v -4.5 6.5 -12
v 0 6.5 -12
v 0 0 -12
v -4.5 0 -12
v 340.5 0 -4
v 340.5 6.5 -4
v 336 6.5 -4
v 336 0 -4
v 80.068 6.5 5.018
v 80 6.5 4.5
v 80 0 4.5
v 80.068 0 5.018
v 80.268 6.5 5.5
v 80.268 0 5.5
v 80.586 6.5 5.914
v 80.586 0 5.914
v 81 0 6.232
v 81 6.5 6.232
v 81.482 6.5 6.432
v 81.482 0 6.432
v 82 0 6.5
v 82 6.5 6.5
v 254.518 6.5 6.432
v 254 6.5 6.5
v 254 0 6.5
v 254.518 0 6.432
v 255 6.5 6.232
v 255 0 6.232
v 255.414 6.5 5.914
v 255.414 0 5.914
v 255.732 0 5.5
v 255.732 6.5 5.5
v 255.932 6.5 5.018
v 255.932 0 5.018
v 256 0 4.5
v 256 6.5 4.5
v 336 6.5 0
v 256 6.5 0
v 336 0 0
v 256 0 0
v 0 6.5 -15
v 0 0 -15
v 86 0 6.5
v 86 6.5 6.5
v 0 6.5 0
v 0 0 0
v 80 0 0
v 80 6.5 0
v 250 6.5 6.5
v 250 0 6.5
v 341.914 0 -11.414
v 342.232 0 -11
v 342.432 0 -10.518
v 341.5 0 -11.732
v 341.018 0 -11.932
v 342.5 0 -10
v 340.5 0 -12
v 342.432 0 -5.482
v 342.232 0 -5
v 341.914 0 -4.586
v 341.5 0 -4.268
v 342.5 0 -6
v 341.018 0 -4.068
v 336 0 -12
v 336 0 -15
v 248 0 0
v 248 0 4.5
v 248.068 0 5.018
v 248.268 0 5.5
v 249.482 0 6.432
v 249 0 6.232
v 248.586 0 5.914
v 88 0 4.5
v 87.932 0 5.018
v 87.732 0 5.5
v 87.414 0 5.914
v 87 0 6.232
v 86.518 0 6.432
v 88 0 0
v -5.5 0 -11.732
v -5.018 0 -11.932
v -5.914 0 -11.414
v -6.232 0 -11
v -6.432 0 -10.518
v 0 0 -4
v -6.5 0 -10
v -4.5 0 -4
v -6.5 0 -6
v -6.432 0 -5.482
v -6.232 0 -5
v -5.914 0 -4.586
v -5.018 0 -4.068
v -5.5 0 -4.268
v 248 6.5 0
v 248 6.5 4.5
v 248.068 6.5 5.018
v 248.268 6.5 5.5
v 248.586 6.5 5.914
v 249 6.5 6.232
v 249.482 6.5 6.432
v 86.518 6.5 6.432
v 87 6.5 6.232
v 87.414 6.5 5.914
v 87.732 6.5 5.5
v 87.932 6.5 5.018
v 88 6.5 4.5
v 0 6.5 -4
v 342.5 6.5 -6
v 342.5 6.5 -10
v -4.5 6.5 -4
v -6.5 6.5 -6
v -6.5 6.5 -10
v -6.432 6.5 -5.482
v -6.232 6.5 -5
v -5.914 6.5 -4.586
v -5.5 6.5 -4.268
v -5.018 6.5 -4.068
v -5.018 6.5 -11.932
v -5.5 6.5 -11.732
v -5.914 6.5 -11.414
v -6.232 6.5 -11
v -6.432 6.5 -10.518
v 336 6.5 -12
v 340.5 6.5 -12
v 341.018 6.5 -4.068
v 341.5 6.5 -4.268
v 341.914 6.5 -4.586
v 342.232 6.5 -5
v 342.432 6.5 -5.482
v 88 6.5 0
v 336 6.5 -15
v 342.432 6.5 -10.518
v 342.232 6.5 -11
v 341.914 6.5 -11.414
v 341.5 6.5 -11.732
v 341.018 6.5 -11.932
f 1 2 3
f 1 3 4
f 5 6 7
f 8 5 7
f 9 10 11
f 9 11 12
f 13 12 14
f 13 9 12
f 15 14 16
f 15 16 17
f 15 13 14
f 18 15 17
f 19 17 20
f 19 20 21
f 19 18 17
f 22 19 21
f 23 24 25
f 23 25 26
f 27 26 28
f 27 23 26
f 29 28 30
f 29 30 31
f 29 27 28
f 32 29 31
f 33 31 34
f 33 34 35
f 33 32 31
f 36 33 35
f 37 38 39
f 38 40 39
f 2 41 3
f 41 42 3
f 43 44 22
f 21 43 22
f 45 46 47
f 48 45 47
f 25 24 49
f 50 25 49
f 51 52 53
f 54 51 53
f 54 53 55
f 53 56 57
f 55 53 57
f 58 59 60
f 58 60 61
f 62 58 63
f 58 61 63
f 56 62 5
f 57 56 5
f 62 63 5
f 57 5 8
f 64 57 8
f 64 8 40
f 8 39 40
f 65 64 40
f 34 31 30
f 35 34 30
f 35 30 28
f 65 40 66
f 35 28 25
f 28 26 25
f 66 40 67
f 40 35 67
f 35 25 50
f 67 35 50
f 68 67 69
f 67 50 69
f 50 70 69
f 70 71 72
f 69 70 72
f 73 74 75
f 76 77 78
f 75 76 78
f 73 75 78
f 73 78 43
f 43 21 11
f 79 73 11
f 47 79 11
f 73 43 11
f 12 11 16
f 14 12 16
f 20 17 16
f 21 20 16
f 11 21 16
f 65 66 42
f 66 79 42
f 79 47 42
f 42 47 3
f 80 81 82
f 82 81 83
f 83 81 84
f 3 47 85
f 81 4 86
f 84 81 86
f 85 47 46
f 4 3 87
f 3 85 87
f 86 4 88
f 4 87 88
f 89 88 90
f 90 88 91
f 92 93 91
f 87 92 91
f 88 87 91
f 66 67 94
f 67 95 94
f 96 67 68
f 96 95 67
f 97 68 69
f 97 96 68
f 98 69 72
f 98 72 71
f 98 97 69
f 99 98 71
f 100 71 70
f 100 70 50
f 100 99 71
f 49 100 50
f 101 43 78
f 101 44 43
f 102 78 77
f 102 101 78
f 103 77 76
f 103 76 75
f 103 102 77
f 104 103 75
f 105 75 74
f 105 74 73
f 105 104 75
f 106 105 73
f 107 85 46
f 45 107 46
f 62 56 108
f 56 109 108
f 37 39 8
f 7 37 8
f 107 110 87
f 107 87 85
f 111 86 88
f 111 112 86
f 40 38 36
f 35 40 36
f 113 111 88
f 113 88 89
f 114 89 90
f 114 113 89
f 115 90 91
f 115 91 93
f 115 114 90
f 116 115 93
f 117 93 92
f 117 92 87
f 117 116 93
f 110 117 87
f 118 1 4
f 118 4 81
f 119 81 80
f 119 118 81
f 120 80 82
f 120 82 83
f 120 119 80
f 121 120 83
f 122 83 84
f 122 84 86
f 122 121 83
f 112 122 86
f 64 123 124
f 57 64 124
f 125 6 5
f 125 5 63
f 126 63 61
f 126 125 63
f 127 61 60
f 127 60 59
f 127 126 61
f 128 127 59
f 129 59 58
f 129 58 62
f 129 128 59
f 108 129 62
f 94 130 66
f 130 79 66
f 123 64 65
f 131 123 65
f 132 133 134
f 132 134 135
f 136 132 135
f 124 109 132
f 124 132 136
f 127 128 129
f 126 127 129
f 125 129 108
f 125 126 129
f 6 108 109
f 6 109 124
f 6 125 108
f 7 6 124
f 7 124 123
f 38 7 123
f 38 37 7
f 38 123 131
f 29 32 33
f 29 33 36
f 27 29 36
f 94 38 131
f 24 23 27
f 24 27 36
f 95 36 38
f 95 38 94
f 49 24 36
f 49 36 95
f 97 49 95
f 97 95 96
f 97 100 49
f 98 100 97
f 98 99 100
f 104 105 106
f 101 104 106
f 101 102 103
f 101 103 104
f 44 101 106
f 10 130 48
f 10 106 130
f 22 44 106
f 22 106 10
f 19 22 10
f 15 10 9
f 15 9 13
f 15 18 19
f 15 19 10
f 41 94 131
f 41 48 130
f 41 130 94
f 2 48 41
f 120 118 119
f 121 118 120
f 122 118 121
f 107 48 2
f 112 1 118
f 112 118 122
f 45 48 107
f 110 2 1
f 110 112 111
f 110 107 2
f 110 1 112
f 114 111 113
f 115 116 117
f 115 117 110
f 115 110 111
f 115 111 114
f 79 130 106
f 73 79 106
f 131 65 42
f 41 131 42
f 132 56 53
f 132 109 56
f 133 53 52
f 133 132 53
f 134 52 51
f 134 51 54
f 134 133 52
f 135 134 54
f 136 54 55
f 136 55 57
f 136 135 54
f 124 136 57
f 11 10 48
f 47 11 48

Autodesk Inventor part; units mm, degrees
ref_plane "YZ Plane" through (0, 0, 0) normal (1, 0, 0) x (0, 1, 0)
ref_plane "XZ Plane" through (0, 0, 0) normal (0, 1, 0) x (-1, 0, 0)
ref_plane "XY Plane" through (0, 0, 0) normal (0, 0, 1) x (1, 0, 0)
sketch "Sketch1" plane through (0, 0, 0) normal (0, 1, 0) x (-1, 0, 0)
  line L0 (0, 0) -> (-336, 0)
  line L1 (-336, 0) -> (-336, -15)
  line L2 (-336, -15) -> (0, -15)
  line L3 (0, -15) -> (0, 0)
  dimension "d0" = 15
  dimension "d1" = 336
extrude "Extrusion1" add sketch "Sketch1" along normal blind 6.5
sketch "Sketch2" plane through (0, 6.5, 0) normal (0, 1, 0) x (1, 0, 0)
  line L0 (0, 0) -> (336, 0) projected
  line L1 (336, 0) -> (336, 15) projected
  line L2 (0, 15) -> (0, 0) projected
  line L3 (0, 12) -> (-4.5, 12)
  line L4 (-6.5, 10) -> (-6.5, 6)
  line L5 (-4.5, 4) -> (0, 4)
  line L6 (0, 4) -> (0, 12)
  line L7 (336, 12) -> (340.5, 12)
  line L8 (342.5, 10) -> (342.5, 6)
  line L9 (340.5, 4) -> (336, 4)
  line L10 (336, 4) -> (336, 12)
  line L11 (80, 0) -> (88, 0)
  line L12 (88, 0) -> (88, -4.5)
  line L13 (86, -6.5) -> (82, -6.5)
  line L14 (80, -4.5) -> (80, 0)
  line L15 (248, 0) -> (256, 0)
  line L16 (256, 0) -> (256, -4.5)
  line L17 (254, -6.5) -> (250, -6.5)
  line L18 (248, -4.5) -> (248, 0)
  arc A0 (-4.5, 12) -> (-6.5, 10) centre (-4.5, 10) ccw
  arc A1 (-6.5, 6) -> (-4.5, 4) centre (-4.5, 6) ccw
  arc A2 (80, -4.5) -> (82, -6.5) centre (82, -4.5) ccw
  arc A3 (86, -6.5) -> (88, -4.5) centre (86, -4.5) ccw
  arc A4 (248, -4.5) -> (250, -6.5) centre (250, -4.5) ccw
  arc A5 (254, -6.5) -> (256, -4.5) centre (254, -4.5) ccw
  arc A6 (340.5, 4) -> (342.5, 6) centre (340.5, 6) ccw
  arc A7 (342.5, 10) -> (340.5, 12) centre (340.5, 10) ccw
  dimension "d4" = 2
  dimension "d5" = 8
  dimension "d6" = 8
  dimension "d7" = 8
  dimension "d8" = 8
  dimension "d9" = 6.5
  dimension "d10" = 6.5
  dimension "d11" = 6.5
  dimension "d12" = 4
  dimension "d13" = 80
  dimension "d14" = 80
extrude "Extrusion2" add sketch "Sketch2" against normal blind 6.5
equation "\"d6\" = d5"
equation "\"d7\" = d6"
equation "\"d8\" = d7"
equation "\"d10\" = d9"
equation "\"d11\" = d9"
equation "\"d14\" = d13"
properties part number "front_upper_brace" material "Plywood, Finish"
